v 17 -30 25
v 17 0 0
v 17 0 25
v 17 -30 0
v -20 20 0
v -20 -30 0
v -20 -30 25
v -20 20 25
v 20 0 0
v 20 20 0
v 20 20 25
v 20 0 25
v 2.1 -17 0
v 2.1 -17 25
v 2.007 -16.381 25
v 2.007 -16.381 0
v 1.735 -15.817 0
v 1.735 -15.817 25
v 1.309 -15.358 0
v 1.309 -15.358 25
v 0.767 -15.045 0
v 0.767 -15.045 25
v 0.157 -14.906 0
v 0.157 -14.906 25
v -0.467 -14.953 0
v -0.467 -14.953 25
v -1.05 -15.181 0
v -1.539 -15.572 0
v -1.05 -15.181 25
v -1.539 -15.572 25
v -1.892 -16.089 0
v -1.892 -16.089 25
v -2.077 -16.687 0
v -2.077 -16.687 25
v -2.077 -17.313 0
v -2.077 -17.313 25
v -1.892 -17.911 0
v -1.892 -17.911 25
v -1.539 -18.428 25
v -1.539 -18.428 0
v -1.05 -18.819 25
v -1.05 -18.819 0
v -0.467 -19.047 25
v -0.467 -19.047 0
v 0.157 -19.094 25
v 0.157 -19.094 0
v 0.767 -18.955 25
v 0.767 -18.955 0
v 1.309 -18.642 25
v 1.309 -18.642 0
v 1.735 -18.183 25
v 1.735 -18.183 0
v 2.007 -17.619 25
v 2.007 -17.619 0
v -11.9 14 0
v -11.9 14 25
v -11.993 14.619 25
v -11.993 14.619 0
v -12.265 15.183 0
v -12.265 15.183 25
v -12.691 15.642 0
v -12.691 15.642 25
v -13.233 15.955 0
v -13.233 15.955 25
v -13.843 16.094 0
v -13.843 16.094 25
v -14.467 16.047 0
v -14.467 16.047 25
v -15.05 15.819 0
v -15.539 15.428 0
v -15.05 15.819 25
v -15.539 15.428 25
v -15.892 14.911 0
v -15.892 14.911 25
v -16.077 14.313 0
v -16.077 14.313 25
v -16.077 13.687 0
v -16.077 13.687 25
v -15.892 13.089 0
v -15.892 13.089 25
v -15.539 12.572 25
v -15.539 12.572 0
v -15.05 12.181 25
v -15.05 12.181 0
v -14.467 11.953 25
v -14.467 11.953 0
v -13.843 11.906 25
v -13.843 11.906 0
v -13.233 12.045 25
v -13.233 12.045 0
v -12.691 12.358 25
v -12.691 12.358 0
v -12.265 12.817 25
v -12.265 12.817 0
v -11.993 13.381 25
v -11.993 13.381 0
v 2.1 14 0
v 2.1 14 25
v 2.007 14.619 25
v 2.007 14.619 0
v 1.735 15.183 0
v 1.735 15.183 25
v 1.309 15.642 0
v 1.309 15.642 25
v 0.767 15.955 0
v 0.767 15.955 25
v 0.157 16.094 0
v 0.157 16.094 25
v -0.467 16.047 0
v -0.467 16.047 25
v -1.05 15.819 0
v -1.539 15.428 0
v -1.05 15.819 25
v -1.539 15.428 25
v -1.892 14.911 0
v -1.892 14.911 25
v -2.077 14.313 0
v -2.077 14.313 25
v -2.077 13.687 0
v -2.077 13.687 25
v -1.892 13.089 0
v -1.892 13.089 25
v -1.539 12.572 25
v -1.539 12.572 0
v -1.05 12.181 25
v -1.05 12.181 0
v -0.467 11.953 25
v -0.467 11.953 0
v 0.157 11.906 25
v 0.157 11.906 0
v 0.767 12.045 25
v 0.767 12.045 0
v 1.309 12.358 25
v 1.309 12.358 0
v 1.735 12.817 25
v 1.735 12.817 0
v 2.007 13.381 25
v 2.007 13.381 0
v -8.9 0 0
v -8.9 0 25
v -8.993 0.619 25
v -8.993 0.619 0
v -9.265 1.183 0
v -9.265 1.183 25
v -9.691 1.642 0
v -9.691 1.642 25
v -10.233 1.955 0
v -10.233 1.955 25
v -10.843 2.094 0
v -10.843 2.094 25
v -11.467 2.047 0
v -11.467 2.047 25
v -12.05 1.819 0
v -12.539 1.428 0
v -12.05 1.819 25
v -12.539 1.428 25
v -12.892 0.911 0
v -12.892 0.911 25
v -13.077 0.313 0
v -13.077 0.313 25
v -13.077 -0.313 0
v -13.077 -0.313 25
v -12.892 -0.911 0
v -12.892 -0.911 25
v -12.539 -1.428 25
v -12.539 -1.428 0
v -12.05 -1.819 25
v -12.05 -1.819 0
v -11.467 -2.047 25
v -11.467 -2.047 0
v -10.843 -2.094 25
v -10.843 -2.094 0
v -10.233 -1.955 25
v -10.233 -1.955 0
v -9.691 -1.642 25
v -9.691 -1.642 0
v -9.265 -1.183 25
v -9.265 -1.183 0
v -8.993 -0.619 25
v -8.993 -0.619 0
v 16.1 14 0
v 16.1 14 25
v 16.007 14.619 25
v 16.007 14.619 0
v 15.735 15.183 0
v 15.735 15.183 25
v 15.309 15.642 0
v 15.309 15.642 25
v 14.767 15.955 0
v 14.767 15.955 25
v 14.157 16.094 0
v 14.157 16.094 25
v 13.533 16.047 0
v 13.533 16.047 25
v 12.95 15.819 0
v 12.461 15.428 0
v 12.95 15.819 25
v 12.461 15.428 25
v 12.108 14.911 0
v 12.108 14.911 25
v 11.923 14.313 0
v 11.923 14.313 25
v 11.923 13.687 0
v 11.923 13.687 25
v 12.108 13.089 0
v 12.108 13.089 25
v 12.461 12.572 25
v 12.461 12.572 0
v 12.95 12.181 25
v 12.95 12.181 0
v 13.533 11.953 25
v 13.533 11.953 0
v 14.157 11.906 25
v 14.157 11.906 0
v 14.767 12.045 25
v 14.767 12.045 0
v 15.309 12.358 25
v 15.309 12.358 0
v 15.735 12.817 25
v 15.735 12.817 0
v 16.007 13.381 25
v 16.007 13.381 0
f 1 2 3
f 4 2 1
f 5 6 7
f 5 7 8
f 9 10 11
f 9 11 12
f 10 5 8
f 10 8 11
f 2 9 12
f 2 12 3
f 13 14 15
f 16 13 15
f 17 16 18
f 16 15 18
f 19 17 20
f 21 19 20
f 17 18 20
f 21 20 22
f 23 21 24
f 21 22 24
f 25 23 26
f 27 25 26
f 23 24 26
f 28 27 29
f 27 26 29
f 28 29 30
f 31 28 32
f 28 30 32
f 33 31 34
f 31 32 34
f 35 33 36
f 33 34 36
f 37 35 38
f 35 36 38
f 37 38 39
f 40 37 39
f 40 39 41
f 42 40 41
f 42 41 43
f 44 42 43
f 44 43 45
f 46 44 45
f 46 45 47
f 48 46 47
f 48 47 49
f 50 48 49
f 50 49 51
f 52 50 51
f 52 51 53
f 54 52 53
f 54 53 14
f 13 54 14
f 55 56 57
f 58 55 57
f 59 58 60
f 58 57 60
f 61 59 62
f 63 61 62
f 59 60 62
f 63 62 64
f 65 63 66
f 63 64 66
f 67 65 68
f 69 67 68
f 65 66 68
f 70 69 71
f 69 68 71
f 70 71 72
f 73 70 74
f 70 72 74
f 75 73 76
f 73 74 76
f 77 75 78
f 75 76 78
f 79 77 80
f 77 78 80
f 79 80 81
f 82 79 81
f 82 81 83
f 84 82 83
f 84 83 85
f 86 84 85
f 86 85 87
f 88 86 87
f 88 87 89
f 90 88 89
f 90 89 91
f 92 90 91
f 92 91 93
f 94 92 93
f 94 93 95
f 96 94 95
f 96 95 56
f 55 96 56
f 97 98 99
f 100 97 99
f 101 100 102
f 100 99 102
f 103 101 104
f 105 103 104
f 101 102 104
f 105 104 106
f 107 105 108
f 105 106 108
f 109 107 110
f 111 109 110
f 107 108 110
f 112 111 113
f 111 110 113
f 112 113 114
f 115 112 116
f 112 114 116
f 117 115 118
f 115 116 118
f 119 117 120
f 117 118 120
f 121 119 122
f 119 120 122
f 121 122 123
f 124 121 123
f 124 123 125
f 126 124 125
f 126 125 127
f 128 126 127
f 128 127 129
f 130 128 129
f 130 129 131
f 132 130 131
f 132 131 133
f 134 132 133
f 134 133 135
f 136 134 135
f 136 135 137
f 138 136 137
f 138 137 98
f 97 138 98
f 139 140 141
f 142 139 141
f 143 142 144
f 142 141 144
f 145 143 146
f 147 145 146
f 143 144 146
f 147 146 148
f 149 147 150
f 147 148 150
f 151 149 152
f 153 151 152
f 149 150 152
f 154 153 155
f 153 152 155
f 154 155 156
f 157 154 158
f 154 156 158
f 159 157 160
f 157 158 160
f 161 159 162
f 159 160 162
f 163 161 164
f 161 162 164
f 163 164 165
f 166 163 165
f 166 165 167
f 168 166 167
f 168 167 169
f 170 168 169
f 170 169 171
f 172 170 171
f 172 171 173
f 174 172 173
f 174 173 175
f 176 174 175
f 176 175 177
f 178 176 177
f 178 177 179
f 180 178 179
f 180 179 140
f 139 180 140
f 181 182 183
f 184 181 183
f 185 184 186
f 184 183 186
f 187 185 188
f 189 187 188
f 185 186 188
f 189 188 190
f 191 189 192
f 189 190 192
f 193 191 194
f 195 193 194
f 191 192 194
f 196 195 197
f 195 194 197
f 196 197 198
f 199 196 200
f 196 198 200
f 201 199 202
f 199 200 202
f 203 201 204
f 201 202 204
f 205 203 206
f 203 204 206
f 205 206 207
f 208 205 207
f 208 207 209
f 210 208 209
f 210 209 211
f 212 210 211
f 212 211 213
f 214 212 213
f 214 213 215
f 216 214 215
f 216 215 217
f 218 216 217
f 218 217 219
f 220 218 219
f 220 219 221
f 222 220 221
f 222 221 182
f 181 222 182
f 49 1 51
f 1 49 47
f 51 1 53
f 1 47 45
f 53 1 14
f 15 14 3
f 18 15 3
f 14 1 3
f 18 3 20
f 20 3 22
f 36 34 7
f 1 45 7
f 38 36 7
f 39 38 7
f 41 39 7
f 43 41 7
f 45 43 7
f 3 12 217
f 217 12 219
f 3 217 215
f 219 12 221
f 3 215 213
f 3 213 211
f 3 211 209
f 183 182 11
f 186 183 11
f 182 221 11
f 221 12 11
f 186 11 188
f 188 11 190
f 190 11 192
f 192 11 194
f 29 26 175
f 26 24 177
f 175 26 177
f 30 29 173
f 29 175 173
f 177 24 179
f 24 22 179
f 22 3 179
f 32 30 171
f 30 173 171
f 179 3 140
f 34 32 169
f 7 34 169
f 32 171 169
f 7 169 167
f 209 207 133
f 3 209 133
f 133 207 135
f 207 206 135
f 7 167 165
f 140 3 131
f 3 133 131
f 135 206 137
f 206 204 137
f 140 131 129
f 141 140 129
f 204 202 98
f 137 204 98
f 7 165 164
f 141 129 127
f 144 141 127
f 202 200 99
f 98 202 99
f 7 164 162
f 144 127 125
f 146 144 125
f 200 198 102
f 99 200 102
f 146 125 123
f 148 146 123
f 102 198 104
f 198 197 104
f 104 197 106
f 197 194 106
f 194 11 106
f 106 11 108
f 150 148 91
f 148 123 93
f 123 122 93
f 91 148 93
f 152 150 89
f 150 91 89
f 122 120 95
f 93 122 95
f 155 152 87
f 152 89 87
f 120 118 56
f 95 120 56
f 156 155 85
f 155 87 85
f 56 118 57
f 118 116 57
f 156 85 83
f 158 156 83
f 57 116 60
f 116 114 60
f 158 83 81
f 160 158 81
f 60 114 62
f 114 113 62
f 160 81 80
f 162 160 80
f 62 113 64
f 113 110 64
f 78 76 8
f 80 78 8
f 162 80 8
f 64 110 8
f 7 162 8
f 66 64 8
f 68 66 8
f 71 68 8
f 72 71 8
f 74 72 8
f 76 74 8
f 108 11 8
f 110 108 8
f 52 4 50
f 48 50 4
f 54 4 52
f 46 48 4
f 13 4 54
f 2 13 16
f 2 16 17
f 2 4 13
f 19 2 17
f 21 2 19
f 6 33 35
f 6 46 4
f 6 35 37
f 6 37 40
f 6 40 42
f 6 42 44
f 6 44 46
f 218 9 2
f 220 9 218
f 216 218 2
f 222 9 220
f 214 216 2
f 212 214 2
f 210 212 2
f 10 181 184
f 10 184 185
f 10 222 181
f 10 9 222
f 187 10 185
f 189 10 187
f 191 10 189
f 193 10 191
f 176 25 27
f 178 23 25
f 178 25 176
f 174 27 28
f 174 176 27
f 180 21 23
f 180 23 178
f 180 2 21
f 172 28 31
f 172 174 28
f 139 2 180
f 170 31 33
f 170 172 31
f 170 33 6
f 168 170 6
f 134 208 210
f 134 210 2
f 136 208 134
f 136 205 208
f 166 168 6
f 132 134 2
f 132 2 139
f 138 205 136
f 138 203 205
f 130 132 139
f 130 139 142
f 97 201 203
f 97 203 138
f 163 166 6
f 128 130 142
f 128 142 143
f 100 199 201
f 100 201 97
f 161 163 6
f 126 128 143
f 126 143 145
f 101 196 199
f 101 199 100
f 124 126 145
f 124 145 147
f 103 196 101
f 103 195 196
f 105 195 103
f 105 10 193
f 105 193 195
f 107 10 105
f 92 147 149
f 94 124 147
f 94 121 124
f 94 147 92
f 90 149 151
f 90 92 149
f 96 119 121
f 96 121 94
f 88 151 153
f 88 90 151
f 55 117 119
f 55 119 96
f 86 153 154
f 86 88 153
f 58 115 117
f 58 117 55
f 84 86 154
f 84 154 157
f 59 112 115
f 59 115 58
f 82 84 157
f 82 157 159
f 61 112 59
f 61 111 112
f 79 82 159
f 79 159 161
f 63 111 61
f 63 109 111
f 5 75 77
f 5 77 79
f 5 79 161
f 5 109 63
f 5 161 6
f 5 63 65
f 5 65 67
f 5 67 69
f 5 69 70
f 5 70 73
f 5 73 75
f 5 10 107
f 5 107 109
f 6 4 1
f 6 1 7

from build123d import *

# Parameters (mm, degrees)
PAD_DEPTH    = 25
SKETCH003_R  = 2.1
POCKET_DEPTH = 25.001


with BuildPart() as part:
    # Sketch → Pad (new body)
    with BuildSketch(Plane.XY):
        Polygon((17, -30), (-20, -30), (-20, 20), (20, 20), (20, 0), (17, 0), align=None)
    extrude(amount=PAD_DEPTH)

    # Sketch003 (on Face8 of Pad) → Pocket (cut, through all)
    with BuildSketch(Plane.XY.offset(25)):
        with Locations((0, -17)):
            Circle(SKETCH003_R)
        with Locations((-11, 0)):
            Circle(SKETCH003_R)
        with Locations((-14, 14)):
            Circle(SKETCH003_R)
        with Locations((14, 14)):
            Circle(SKETCH003_R)
        with Locations((0, 14)):
            Circle(SKETCH003_R)
    extrude(amount=-POCKET_DEPTH, mode=Mode.SUBTRACT)


solid = part.part
